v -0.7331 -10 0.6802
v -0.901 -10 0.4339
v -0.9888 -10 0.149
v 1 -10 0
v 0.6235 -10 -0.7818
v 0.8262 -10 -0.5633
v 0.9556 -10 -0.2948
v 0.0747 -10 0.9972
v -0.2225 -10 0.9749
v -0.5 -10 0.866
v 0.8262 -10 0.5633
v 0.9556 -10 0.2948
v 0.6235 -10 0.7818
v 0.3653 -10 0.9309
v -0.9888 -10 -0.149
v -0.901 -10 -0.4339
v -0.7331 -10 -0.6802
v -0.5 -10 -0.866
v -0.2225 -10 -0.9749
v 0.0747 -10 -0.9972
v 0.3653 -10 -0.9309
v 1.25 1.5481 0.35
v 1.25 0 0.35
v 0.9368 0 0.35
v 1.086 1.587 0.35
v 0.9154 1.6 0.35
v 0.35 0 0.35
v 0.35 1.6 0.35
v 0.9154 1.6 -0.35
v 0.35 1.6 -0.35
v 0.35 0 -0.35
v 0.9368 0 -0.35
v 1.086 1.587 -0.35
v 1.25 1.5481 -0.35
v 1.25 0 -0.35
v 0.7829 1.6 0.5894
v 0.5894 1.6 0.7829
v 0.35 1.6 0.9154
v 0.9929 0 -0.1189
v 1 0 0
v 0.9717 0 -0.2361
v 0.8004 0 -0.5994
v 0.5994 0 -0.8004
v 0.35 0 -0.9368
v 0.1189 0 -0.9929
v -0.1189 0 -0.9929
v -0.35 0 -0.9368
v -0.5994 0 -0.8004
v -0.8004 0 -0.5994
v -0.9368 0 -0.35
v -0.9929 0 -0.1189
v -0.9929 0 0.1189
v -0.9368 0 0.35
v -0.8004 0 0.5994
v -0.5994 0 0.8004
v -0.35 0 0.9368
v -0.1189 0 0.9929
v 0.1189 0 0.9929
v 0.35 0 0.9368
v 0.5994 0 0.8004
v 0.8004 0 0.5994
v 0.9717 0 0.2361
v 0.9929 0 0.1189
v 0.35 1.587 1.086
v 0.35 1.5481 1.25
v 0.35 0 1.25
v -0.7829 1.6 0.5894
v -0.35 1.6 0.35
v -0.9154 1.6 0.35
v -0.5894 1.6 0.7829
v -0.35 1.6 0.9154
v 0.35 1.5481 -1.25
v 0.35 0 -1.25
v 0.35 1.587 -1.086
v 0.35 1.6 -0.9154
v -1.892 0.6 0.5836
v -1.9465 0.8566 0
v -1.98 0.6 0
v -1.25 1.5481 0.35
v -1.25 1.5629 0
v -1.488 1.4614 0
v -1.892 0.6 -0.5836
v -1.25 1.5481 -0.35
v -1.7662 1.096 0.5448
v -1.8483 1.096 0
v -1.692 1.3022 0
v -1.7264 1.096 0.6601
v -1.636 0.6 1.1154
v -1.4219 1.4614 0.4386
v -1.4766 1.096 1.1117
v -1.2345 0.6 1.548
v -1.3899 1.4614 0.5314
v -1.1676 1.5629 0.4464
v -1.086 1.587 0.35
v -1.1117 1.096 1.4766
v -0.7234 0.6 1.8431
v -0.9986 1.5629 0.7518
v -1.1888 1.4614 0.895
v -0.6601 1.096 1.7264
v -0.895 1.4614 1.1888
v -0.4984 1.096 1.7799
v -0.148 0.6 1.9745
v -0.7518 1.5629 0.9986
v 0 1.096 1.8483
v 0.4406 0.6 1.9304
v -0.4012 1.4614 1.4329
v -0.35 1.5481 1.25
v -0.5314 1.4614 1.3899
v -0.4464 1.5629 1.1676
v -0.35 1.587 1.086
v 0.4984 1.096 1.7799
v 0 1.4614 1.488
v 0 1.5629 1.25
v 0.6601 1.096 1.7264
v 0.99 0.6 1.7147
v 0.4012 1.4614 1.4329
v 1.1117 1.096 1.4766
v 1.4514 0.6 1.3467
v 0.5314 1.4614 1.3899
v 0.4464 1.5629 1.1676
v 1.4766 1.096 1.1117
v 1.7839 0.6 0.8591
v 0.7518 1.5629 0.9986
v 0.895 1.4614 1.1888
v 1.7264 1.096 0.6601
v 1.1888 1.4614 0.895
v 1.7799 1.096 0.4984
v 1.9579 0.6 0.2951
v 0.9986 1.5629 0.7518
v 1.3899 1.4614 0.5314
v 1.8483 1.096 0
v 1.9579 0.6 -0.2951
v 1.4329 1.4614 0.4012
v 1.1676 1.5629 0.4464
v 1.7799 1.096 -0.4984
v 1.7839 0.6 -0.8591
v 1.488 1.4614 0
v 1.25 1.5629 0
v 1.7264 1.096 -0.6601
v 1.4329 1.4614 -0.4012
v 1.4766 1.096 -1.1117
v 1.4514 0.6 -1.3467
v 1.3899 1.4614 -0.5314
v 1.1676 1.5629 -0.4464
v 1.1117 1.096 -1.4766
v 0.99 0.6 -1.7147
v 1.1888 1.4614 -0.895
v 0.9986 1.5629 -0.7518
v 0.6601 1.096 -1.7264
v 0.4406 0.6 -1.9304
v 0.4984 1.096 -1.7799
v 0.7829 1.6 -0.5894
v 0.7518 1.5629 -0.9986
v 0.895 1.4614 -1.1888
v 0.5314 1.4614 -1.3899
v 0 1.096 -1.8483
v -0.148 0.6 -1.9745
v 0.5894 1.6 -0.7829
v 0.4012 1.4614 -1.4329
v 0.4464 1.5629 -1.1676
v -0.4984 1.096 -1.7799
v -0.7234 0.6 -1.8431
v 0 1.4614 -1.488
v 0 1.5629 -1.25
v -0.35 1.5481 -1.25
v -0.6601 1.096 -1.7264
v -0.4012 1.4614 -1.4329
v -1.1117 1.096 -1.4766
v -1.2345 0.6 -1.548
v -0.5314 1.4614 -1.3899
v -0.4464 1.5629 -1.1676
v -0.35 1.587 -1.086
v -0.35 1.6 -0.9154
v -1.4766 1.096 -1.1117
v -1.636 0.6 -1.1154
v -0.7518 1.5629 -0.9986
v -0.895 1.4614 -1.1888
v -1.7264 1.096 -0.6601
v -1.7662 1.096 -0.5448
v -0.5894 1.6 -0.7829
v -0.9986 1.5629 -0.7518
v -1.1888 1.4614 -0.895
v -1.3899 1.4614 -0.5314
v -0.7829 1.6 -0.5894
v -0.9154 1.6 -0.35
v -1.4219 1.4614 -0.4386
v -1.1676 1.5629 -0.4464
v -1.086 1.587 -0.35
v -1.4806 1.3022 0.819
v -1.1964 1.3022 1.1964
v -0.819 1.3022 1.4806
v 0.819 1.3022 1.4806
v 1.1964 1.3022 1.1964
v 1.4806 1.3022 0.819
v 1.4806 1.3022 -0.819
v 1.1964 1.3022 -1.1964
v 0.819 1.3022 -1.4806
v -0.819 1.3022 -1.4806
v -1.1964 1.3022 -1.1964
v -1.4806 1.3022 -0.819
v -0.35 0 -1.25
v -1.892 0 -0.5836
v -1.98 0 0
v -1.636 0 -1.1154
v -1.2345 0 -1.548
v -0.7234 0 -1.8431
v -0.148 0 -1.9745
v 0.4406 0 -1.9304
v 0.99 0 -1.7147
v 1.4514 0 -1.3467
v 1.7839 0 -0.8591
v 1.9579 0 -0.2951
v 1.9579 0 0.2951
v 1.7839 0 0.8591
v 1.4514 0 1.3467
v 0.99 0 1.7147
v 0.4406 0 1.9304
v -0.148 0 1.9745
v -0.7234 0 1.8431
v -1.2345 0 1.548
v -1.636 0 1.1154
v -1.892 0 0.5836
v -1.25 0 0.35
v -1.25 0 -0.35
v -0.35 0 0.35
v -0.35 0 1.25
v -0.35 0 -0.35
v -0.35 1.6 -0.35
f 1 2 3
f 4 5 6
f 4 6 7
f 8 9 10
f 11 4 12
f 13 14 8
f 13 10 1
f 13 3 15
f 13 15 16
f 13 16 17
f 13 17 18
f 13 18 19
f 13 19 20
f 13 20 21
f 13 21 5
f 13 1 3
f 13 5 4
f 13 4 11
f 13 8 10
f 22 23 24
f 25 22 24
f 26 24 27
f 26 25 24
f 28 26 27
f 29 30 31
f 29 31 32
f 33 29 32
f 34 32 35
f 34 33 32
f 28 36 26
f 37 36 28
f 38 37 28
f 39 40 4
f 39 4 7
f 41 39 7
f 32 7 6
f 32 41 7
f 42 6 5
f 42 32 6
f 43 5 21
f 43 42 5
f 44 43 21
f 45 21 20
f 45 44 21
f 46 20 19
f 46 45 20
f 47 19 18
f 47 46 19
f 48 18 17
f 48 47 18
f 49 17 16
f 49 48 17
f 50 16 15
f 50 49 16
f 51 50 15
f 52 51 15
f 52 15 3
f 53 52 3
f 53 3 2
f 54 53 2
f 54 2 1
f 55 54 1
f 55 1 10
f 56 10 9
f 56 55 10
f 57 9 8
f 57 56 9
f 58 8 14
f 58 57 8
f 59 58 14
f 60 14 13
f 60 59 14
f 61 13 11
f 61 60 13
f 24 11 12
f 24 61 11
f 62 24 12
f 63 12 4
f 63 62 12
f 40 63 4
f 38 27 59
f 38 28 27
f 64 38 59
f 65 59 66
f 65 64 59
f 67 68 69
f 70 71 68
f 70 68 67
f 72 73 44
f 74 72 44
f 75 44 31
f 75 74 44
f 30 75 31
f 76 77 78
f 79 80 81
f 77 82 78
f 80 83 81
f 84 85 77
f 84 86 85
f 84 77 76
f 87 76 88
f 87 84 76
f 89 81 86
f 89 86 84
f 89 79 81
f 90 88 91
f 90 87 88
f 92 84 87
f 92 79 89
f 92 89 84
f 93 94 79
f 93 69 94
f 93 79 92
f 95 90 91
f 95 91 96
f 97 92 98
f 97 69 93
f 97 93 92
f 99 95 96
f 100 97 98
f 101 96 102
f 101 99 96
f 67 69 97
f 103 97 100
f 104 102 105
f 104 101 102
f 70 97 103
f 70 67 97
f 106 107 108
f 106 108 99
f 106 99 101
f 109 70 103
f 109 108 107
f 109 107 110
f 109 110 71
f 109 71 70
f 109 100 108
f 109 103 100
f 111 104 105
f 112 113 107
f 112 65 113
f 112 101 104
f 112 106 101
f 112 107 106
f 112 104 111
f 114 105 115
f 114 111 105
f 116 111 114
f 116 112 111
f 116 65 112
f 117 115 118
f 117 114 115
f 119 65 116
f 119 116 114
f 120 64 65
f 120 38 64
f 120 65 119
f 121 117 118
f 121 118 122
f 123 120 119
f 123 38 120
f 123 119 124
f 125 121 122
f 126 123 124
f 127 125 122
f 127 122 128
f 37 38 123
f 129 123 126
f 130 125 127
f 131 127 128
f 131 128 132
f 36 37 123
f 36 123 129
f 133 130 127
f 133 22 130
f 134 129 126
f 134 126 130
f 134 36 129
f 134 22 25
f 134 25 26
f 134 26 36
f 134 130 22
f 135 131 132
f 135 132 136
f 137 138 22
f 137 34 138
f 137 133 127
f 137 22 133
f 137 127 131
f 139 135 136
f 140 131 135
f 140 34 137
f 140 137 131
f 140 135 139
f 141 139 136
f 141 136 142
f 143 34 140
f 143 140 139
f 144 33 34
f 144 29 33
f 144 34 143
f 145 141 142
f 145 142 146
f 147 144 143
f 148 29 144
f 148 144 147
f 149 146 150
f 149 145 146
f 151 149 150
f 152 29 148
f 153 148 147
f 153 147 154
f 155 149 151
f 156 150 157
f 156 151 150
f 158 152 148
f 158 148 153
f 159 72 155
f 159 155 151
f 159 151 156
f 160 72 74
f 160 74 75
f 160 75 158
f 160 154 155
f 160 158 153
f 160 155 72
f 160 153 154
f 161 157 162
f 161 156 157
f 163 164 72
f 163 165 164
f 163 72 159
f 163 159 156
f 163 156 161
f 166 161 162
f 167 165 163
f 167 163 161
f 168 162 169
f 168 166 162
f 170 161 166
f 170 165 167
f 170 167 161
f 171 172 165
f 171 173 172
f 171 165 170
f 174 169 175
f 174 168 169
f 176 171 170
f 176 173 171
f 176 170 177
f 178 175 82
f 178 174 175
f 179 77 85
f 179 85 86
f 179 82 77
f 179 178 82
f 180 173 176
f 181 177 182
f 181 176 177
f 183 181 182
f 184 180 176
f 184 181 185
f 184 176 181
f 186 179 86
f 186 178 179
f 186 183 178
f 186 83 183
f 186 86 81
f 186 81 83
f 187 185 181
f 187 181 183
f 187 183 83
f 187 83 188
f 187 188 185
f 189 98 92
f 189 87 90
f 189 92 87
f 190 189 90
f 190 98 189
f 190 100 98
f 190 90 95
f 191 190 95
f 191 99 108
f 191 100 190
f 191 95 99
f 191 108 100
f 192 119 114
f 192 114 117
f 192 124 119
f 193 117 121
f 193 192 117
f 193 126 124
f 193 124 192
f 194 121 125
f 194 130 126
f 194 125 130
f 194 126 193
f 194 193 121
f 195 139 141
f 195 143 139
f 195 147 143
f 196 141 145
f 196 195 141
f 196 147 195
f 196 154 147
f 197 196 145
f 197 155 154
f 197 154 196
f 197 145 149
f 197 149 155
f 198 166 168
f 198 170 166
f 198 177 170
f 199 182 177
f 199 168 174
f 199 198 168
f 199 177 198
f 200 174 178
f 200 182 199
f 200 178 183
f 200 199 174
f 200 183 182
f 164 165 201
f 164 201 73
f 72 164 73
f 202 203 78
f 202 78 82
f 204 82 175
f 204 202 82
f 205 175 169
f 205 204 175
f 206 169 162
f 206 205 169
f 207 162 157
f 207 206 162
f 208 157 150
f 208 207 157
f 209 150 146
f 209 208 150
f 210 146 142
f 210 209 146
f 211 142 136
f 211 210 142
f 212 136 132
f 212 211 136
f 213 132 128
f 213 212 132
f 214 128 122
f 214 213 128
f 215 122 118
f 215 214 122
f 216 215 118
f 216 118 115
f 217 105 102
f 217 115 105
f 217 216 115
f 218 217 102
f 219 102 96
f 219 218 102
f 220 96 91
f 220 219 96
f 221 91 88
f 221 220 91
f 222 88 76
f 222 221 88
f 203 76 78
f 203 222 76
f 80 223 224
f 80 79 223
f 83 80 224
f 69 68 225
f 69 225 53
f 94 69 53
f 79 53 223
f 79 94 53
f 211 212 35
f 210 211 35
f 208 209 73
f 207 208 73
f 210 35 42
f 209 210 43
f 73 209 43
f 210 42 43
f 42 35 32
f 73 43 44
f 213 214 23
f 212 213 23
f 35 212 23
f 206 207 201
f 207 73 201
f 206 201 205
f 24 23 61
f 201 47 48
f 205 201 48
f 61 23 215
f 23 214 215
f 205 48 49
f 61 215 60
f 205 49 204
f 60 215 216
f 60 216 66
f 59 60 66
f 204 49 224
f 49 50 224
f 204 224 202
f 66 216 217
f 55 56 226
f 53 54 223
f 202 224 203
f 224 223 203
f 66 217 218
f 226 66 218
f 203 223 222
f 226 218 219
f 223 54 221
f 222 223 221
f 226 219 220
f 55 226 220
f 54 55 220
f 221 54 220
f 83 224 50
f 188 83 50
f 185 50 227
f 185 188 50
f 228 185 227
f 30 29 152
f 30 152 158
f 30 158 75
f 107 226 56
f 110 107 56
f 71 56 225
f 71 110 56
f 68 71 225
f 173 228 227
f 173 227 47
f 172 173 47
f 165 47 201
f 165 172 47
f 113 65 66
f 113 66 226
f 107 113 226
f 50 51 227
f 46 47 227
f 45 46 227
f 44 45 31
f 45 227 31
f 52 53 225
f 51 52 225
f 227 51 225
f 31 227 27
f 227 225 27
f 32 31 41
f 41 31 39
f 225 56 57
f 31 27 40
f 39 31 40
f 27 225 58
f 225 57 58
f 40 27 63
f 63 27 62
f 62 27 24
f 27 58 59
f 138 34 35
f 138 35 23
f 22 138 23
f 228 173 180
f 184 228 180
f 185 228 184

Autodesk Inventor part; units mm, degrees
ref_plane "YZ Plane" through (0, 0, 0) normal (1, 0, 0) x (0, 1, 0)
ref_plane "XZ Plane" through (0, 0, 0) normal (0, 1, 0) x (-1, 0, 0)
ref_plane "XY Plane" through (0, 0, 0) normal (0, 0, 1) x (1, 0, 0)
sketch "Sketch1" plane through (0, 0, 0) normal (0, 1, 0) x (-1, 0, 0)
  circle A0 centre (0, 0) radius 1.98
  dimension "d0" = 3.96
extrude "Extrusion1" add sketch "Sketch1" along normal blind 1.6
sketch "Sketch2" plane through (0, 1.6, 0) normal (0, 1, 0) x (1, 0, 0)
  line L0 (-0.35, -0.35) -> (-1.25, -0.35)
  line L1 (-1.25, -0.35) -> (-1.25, 0.35)
  line L2 (-1.25, 0.35) -> (-0.35, 0.35)
  line L3 (-0.35, 0.35) -> (-0.35, 1.25)
  line L4 (-0.35, 1.25) -> (0.35, 1.25)
  line L5 (0.35, 1.25) -> (0.35, 0.35)
  line L6 (0.35, 0.35) -> (1.25, 0.35)
  line L7 (1.25, 0.35) -> (1.25, -0.35)
  line L8 (1.25, -0.35) -> (0.35, -0.35)
  line L9 (0.35, -1.25) -> (-0.35, -1.25)
  line L10 (-0.35, -1.25) -> (-0.35, -0.35)
  line L11 (0.35, -0.35) -> (0.35, -1.25)
  point P0 (0, 0)
  point P1 (0, -1.25)
  point P2 (0, 1.25)
  point P3 (-1.25, 0)
  point P4 (1.25, 0)
  dimension "d3" = 2.5
  dimension "d4" = 2.5
  dimension "d5" = 1.25
  dimension "d6" = 1.25
  dimension "d7" = 0.7
  dimension "d8" = 0.7
extrude "Extrusion2" cut sketch "Sketch2" against normal blind 2
fillet "Fillet1" radius 1 1 edges at (1.98, 1.6, 0)
sketch "Sketch3" plane through (0, 0, 0) normal (0, -1, 0) x (1, 0, 0)
  circle A0 centre (0, 0) radius 1
  dimension "d12" = 2
extrude "Extrusion3" add sketch "Sketch3" along normal blind 10
thread "Thread1" size "M2x0.4" class "6g" standard "ANSI Metric M Profile" full length
equation "\"d4\" = d3"
equation "\"d5\" = 0.5 * d4"
equation "\"d6\" = d5"
equation "\"d8\" = d7"
equation "\"d13\" = length"
equation "\"length\" = 10"
properties part number "M4_8mm" material "Stainless Steel"
